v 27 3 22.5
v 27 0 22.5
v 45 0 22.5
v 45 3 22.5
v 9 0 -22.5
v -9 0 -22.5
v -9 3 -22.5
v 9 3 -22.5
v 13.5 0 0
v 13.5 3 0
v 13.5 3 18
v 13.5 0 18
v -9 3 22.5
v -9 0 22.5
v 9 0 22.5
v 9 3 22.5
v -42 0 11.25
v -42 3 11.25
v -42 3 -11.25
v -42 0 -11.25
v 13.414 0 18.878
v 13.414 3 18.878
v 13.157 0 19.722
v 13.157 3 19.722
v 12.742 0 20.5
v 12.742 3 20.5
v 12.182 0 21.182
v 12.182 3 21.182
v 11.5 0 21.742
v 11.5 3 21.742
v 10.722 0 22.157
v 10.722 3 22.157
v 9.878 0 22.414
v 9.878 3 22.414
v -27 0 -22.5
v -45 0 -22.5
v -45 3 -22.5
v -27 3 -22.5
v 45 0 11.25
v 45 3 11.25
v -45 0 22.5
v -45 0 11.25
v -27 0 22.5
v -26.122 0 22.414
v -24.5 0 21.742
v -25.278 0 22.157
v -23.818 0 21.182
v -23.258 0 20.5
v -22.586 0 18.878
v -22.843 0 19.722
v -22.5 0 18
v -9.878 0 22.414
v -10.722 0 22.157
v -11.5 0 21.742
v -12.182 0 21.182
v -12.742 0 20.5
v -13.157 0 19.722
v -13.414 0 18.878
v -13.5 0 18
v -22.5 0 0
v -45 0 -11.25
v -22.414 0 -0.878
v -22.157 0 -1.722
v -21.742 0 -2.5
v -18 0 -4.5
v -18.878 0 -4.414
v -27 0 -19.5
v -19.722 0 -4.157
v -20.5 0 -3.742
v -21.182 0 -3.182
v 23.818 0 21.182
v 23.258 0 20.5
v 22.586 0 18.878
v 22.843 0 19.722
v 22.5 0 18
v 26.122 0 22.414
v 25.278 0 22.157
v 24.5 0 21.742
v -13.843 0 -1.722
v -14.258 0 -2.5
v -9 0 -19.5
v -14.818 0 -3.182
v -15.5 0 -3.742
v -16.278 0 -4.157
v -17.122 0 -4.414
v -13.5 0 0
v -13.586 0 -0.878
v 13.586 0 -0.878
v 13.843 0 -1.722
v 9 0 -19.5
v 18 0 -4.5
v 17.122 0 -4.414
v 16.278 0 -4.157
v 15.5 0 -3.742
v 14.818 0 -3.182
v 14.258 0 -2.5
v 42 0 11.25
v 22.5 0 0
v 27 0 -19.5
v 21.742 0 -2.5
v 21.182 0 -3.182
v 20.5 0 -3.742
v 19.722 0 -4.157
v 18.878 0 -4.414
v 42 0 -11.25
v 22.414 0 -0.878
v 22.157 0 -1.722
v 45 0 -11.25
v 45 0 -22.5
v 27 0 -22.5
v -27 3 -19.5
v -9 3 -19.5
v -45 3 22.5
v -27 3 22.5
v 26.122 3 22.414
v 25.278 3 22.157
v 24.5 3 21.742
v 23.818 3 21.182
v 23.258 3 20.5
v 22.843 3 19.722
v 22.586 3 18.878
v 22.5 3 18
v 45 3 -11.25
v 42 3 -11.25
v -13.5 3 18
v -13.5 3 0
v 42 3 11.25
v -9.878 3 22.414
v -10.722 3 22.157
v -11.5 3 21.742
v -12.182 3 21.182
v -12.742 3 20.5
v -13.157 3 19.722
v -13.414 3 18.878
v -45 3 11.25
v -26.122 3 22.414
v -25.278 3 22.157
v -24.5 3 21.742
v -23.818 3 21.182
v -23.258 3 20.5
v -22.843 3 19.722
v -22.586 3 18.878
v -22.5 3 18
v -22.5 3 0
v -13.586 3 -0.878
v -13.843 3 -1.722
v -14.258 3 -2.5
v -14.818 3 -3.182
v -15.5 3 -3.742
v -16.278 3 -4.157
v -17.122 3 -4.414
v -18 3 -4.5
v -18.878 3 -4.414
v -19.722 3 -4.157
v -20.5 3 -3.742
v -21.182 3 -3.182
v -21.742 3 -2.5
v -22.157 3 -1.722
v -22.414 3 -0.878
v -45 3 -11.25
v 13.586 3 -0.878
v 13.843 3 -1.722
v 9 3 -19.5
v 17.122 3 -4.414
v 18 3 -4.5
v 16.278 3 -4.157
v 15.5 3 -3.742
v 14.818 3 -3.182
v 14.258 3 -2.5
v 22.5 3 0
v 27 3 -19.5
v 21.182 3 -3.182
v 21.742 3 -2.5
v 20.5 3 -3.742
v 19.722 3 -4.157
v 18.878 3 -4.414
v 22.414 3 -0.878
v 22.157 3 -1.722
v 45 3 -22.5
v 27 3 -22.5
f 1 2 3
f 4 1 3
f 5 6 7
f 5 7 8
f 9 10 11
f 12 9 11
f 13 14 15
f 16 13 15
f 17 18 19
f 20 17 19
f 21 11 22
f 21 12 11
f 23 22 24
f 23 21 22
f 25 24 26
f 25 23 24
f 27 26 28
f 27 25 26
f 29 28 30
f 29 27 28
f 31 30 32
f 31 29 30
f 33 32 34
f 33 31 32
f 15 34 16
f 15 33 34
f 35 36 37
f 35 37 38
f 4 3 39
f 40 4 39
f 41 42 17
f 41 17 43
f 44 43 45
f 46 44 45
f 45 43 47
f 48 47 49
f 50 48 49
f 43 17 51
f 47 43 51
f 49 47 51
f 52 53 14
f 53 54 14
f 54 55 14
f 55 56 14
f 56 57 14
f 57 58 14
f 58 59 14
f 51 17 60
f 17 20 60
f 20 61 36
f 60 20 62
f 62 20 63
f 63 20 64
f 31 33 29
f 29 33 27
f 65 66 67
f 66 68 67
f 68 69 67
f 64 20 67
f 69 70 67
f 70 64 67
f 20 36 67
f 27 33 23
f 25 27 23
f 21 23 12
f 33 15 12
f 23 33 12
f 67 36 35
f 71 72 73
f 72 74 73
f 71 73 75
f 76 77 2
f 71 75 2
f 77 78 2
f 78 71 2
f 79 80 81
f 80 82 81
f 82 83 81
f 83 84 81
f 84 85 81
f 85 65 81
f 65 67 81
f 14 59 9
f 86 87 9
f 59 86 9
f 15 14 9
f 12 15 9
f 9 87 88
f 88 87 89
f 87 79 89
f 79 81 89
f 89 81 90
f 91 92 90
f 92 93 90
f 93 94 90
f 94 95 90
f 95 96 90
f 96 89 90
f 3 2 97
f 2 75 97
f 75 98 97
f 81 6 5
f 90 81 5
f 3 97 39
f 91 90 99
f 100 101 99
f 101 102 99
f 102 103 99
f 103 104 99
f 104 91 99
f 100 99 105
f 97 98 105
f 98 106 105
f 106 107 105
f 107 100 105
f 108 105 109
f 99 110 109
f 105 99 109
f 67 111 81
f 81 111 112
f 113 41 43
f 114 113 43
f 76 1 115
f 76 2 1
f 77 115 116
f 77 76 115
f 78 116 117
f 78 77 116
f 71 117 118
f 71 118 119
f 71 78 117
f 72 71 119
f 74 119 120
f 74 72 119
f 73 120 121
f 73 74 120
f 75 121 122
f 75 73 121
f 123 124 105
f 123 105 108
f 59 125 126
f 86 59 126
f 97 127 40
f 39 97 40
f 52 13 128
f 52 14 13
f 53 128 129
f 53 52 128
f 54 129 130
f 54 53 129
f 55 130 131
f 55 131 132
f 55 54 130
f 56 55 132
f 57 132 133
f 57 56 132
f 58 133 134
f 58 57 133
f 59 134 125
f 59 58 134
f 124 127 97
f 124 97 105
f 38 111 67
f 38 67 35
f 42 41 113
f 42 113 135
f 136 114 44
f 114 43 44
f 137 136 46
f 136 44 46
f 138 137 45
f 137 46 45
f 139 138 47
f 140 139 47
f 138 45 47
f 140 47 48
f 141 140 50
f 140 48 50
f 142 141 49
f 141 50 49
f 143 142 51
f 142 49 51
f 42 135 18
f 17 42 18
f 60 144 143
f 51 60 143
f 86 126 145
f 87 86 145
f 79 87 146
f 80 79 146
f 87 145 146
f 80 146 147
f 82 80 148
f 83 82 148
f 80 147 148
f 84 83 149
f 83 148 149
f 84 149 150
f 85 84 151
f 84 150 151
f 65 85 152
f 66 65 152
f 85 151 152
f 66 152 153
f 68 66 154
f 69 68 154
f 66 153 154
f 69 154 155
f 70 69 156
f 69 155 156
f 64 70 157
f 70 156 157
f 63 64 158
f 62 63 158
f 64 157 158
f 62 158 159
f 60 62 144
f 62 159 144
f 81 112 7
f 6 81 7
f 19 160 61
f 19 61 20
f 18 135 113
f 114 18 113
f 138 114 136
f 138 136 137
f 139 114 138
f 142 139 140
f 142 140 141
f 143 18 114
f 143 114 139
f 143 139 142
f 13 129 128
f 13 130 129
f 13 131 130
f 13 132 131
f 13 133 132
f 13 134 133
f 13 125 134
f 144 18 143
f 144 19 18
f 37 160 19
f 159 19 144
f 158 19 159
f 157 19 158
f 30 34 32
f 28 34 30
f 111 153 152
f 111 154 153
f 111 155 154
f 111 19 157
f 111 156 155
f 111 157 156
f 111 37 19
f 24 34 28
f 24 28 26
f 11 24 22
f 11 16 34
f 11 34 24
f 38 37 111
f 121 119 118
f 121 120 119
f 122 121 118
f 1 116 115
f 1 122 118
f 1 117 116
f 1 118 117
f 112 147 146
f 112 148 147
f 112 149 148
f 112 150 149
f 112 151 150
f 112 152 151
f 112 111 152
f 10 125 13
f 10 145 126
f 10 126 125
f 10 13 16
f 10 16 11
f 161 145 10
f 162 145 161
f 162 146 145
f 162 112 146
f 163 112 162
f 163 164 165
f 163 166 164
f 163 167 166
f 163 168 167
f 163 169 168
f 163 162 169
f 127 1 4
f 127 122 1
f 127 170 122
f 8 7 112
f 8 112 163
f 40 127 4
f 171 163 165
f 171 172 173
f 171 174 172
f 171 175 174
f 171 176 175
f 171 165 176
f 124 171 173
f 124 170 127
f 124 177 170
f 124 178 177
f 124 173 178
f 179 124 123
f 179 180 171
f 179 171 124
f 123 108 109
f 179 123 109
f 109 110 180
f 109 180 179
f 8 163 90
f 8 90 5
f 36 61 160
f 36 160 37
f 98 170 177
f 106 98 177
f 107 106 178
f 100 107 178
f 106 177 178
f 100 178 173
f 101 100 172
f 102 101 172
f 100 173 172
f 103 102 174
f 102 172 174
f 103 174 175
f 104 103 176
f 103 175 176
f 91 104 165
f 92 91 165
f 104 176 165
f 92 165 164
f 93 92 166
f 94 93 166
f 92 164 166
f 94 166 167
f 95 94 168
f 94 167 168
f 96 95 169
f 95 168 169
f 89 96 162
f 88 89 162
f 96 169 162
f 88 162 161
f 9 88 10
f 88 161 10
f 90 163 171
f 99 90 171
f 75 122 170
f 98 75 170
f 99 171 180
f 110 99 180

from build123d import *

# Parameters (mm, degrees)
SKETCH1_W           = 90
SKETCH1_H           = 45
BOSS_EXTRUDE1_DEPTH = 3
CUT_EXTRUDE1_DEPTH  = 3
FILLET1_R           = 4.5
SKETCH4_W           = 3
SKETCH4_H           = 22.5
SKETCH4_W_2         = 18
SKETCH4_H_2         = 3
CUT_EXTRUDE4_DEPTH  = 3


with BuildPart() as part:
    # Sketch1 → Boss-Extrude1 (new body)
    with BuildSketch(Plane(origin=(0, 0, 0), x_dir=(1, 0, 0), z_dir=(0, 1, 0))):
        Rectangle(SKETCH1_W, SKETCH1_H)
    extrude(amount=BOSS_EXTRUDE1_DEPTH)

    # Sketch2 → Cut-Extrude1 (cut)
    with BuildSketch(Plane(origin=(0, 3, 0), x_dir=(1, 0, 0), z_dir=(0, 1, 0))):
        with BuildLine():
            Line((-22.5, -22.5), (-13.5, -22.5))
            Line((-13.5, -22.5), (-13.5, 0))
            ThreePointArc((-13.5, 0), (-18, 4.5), (-22.5, 0))
            Line((-22.5, 0), (-22.5, -22.5))
        make_face()
        with BuildLine():
            Line((13.5, -22.5), (22.5, -22.5))
            Line((22.5, -22.5), (22.5, 0))
            ThreePointArc((22.5, 0), (18, 4.5), (13.5, 0))
            Line((13.5, 0), (13.5, -22.5))
        make_face()
    extrude(amount=-CUT_EXTRUDE1_DEPTH, mode=Mode.SUBTRACT)

    # Fillet1
    fillet1_edges = [part.edges().sort_by_distance(p)[0] for p in [
        (-22.5, 1.5, 22.5),
        (-13.5, 1.5, 22.5),
        (13.5, 1.5, 22.5),
        (22.5, 1.5, 22.5),
    ]]
    fillet(fillet1_edges, radius=FILLET1_R)

    # Sketch4 → Cut-Extrude4 (cut)
    with BuildSketch(Plane(origin=(0, 3, 0), x_dir=(1, 0, 0), z_dir=(0, 1, 0))):
        with Locations((-43.5, 0)):
            Rectangle(SKETCH4_W, SKETCH4_H)
        with Locations((-18, 21)):
            Rectangle(SKETCH4_W_2, SKETCH4_H_2)
        with Locations((18, 21)):
            Rectangle(SKETCH4_W_2, SKETCH4_H_2)
        with Locations((43.5, 0)):
            Rectangle(SKETCH4_W, SKETCH4_H)
    extrude(amount=-CUT_EXTRUDE4_DEPTH, mode=Mode.SUBTRACT)


solid = part.part
